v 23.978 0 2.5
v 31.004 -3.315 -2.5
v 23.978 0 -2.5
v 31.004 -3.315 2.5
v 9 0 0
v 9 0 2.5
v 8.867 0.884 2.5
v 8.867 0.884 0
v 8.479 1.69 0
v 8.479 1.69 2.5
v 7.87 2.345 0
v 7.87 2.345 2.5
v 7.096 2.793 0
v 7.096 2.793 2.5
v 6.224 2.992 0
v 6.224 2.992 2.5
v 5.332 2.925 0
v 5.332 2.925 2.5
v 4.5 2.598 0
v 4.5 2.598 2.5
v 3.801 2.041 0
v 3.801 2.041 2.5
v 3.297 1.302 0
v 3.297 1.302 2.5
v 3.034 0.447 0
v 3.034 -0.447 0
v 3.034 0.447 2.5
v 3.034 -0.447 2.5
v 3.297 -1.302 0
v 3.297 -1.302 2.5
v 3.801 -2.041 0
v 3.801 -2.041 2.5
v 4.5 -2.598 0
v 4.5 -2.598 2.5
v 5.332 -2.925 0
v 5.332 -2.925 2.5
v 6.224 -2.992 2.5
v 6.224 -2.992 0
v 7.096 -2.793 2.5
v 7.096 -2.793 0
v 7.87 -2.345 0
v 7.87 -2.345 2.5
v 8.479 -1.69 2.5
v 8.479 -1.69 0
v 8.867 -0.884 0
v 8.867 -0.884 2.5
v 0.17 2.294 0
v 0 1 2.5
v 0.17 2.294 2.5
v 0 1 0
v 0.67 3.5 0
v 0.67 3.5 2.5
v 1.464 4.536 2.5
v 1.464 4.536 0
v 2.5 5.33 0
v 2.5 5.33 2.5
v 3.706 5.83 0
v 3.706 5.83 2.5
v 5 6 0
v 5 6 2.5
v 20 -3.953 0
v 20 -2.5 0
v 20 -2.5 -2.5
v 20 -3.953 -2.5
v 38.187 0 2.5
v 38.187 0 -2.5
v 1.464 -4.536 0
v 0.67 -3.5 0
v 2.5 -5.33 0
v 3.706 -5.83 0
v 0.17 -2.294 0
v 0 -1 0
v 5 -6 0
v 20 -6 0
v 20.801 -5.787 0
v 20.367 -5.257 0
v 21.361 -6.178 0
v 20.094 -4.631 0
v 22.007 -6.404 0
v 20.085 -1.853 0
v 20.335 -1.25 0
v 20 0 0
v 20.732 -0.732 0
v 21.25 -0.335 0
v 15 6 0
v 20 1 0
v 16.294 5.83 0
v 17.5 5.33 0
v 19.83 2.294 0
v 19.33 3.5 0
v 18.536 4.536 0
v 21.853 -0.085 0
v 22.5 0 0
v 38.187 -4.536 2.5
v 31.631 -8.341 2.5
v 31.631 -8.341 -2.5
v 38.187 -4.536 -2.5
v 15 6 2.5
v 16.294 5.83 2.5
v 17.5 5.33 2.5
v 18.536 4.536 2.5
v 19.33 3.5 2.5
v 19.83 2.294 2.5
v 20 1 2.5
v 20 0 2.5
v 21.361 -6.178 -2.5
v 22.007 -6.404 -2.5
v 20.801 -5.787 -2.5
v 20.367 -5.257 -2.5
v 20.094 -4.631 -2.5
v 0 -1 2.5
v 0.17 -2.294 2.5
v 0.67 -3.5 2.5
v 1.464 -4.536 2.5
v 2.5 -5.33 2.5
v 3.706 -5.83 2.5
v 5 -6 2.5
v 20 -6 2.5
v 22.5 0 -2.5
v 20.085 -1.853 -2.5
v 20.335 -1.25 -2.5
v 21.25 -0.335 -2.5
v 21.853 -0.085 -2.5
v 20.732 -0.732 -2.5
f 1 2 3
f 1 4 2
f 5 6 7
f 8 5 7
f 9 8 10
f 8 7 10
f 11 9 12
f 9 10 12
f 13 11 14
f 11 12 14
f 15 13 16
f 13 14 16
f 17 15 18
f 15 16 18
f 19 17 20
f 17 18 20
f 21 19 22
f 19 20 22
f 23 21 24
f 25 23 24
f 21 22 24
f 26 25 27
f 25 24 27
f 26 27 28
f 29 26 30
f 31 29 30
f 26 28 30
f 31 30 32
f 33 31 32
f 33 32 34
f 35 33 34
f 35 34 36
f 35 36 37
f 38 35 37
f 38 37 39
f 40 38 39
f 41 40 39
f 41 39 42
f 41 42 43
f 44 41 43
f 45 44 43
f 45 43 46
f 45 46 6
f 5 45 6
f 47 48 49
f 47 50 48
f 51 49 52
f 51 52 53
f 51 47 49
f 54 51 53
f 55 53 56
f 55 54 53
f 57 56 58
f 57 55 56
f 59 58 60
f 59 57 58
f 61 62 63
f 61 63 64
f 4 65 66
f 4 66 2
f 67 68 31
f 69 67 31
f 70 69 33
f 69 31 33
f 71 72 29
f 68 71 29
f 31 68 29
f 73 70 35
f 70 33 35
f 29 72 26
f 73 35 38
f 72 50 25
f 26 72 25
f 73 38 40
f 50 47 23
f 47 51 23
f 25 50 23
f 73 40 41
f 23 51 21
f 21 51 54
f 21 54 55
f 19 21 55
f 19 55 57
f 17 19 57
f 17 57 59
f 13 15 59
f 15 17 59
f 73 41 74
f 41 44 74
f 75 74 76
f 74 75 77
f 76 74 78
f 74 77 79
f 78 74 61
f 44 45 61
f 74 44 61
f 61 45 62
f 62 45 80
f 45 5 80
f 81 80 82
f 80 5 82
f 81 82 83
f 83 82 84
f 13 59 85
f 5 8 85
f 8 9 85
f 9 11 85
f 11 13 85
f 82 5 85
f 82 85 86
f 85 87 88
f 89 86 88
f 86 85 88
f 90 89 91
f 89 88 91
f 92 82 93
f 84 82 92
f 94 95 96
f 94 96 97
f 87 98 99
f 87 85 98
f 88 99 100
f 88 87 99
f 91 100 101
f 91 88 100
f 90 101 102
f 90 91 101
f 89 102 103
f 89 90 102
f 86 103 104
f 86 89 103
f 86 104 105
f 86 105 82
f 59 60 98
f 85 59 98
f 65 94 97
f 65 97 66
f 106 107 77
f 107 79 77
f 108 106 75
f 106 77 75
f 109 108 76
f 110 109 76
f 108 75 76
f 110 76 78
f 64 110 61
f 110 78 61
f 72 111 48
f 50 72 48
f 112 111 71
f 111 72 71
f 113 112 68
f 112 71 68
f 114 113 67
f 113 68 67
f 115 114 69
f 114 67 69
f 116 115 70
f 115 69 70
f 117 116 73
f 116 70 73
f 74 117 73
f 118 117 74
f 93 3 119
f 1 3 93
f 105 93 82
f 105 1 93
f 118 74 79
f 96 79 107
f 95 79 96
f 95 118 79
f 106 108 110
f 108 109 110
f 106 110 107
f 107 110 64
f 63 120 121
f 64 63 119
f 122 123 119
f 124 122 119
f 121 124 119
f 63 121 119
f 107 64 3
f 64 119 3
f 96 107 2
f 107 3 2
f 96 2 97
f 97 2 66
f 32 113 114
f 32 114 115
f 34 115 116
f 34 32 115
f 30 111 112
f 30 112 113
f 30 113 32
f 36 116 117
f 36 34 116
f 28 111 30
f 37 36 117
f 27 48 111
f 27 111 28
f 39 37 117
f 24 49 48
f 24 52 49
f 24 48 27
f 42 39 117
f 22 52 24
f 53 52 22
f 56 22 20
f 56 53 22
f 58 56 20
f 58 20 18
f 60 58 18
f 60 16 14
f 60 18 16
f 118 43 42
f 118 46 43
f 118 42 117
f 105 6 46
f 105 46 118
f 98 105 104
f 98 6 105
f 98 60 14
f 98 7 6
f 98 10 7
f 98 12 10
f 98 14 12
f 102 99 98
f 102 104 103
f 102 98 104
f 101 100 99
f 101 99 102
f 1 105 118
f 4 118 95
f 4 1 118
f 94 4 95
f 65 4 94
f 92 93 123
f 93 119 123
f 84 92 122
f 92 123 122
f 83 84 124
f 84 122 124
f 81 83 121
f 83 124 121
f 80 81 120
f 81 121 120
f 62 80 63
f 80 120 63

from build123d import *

# Parameters (mm, degrees)
SKETCH1_R           = 6
BOSS_EXTRUDE1_DEPTH = 20
SKETCH3_W           = 4.335084662
SKETCH3_H           = 14.058639044
CUT_EXTRUDE1_DEPTH  = 38
SKETCH4_R           = 3
CUT_EXTRUDE2_DEPTH  = 8
SKETCH5_W           = 6.88313448
SKETCH5_H           = 14.671944549
CUT_EXTRUDE3_DEPTH  = 40
BOSS_EXTRUDE3_DEPTH = 2.5
SKETCH8_W           = 20.918612023
SKETCH8_H           = 4.062773159
CUT_EXTRUDE4_DEPTH  = 12.5
SKETCH9_W           = 20
SKETCH9_H           = 12
BOSS_EXTRUDE4_DEPTH = 2.5
FILLET1_R           = 5
SKETCH10_R          = 3
CUT_EXTRUDE5_DEPTH  = 6.5
FILLET2_R           = 2.5


with BuildPart() as part:
    # Sketch1 → Boss-Extrude1 (new body)
    with BuildSketch(Plane(origin=(0, 0, 0), x_dir=(0, 0, -1), z_dir=(1, 0, 0))):
        Circle(SKETCH1_R)
    extrude(amount=BOSS_EXTRUDE1_DEPTH)

    # Sketch3 → Cut-Extrude1 (cut)
    with BuildSketch(Plane.ZY):
        with Locations((4.667542331, 0.290740447)):
            Rectangle(SKETCH3_W, SKETCH3_H)
    extrude(amount=-CUT_EXTRUDE1_DEPTH, mode=Mode.SUBTRACT)

    # Sketch4 → Cut-Extrude2 (cut)
    with BuildSketch(Plane.XY.offset(2.5)):
        with Locations((5, 0)):
            Circle(SKETCH4_R)
    extrude(amount=-CUT_EXTRUDE2_DEPTH, mode=Mode.SUBTRACT)

    # Sketch5 → Cut-Extrude3 (cut)
    with BuildSketch(Plane(origin=(0, 0, 0), x_dir=(0, 0, -1), z_dir=(1, 0, 0))):
        with Locations((5.94156724, -0.380383747)):
            Rectangle(SKETCH5_W, SKETCH5_H)
    extrude(amount=CUT_EXTRUDE3_DEPTH, mode=Mode.SUBTRACT)

    # Sketch7 → Boss-Extrude3 (add, symmetric)
    with BuildSketch(Plane.XY):
        Polygon((20, 0), (20, -6), (31.63118386, -8.340680909), (38.187356623, -4.535759216), (38.187356623, 0), (31.004497384, -3.314892174), (23.978377494, 0), align=None)
    extrude(amount=BOSS_EXTRUDE3_DEPTH, both=True)

    # Sketch8 → Cut-Extrude4 (cut, symmetric)
    with BuildSketch(Plane(origin=(0, 0, 0), x_dir=(1, 0, 0), z_dir=(0, 1, 0))):
        with Locations((9.540693988, 2.03138658)):
            Rectangle(SKETCH8_W, SKETCH8_H)
    extrude(amount=CUT_EXTRUDE4_DEPTH, both=True, mode=Mode.SUBTRACT)

    # Sketch9 → Boss-Extrude4 (add)
    with BuildSketch(Plane.XY.offset(2.5)):
        with Locations((10, 0)):
            Rectangle(SKETCH9_W, SKETCH9_H)
    extrude(amount=-BOSS_EXTRUDE4_DEPTH)

    # Fillet1
    fillet1_edges = [part.edges().sort_by_distance(p)[0] for p in [
        (0, 6, 1.25),
        (0, -6, 1.25),
        (20, 6, 1.25),
    ]]
    fillet(fillet1_edges, radius=FILLET1_R)

    # Sketch10 → Cut-Extrude5 (cut)
    with BuildSketch(Plane.XY.offset(2.5)):
        with Locations((6, 0)):
            Circle(SKETCH10_R)
    extrude(amount=-CUT_EXTRUDE5_DEPTH, mode=Mode.SUBTRACT)

    # Fillet2
    fillet2_edges = [part.edges().sort_by_distance(p)[0] for p in [
        (20, -6, -1.25),
        (20, 0, -1.25),
    ]]
    fillet(fillet2_edges, radius=FILLET2_R)


solid = part.part
